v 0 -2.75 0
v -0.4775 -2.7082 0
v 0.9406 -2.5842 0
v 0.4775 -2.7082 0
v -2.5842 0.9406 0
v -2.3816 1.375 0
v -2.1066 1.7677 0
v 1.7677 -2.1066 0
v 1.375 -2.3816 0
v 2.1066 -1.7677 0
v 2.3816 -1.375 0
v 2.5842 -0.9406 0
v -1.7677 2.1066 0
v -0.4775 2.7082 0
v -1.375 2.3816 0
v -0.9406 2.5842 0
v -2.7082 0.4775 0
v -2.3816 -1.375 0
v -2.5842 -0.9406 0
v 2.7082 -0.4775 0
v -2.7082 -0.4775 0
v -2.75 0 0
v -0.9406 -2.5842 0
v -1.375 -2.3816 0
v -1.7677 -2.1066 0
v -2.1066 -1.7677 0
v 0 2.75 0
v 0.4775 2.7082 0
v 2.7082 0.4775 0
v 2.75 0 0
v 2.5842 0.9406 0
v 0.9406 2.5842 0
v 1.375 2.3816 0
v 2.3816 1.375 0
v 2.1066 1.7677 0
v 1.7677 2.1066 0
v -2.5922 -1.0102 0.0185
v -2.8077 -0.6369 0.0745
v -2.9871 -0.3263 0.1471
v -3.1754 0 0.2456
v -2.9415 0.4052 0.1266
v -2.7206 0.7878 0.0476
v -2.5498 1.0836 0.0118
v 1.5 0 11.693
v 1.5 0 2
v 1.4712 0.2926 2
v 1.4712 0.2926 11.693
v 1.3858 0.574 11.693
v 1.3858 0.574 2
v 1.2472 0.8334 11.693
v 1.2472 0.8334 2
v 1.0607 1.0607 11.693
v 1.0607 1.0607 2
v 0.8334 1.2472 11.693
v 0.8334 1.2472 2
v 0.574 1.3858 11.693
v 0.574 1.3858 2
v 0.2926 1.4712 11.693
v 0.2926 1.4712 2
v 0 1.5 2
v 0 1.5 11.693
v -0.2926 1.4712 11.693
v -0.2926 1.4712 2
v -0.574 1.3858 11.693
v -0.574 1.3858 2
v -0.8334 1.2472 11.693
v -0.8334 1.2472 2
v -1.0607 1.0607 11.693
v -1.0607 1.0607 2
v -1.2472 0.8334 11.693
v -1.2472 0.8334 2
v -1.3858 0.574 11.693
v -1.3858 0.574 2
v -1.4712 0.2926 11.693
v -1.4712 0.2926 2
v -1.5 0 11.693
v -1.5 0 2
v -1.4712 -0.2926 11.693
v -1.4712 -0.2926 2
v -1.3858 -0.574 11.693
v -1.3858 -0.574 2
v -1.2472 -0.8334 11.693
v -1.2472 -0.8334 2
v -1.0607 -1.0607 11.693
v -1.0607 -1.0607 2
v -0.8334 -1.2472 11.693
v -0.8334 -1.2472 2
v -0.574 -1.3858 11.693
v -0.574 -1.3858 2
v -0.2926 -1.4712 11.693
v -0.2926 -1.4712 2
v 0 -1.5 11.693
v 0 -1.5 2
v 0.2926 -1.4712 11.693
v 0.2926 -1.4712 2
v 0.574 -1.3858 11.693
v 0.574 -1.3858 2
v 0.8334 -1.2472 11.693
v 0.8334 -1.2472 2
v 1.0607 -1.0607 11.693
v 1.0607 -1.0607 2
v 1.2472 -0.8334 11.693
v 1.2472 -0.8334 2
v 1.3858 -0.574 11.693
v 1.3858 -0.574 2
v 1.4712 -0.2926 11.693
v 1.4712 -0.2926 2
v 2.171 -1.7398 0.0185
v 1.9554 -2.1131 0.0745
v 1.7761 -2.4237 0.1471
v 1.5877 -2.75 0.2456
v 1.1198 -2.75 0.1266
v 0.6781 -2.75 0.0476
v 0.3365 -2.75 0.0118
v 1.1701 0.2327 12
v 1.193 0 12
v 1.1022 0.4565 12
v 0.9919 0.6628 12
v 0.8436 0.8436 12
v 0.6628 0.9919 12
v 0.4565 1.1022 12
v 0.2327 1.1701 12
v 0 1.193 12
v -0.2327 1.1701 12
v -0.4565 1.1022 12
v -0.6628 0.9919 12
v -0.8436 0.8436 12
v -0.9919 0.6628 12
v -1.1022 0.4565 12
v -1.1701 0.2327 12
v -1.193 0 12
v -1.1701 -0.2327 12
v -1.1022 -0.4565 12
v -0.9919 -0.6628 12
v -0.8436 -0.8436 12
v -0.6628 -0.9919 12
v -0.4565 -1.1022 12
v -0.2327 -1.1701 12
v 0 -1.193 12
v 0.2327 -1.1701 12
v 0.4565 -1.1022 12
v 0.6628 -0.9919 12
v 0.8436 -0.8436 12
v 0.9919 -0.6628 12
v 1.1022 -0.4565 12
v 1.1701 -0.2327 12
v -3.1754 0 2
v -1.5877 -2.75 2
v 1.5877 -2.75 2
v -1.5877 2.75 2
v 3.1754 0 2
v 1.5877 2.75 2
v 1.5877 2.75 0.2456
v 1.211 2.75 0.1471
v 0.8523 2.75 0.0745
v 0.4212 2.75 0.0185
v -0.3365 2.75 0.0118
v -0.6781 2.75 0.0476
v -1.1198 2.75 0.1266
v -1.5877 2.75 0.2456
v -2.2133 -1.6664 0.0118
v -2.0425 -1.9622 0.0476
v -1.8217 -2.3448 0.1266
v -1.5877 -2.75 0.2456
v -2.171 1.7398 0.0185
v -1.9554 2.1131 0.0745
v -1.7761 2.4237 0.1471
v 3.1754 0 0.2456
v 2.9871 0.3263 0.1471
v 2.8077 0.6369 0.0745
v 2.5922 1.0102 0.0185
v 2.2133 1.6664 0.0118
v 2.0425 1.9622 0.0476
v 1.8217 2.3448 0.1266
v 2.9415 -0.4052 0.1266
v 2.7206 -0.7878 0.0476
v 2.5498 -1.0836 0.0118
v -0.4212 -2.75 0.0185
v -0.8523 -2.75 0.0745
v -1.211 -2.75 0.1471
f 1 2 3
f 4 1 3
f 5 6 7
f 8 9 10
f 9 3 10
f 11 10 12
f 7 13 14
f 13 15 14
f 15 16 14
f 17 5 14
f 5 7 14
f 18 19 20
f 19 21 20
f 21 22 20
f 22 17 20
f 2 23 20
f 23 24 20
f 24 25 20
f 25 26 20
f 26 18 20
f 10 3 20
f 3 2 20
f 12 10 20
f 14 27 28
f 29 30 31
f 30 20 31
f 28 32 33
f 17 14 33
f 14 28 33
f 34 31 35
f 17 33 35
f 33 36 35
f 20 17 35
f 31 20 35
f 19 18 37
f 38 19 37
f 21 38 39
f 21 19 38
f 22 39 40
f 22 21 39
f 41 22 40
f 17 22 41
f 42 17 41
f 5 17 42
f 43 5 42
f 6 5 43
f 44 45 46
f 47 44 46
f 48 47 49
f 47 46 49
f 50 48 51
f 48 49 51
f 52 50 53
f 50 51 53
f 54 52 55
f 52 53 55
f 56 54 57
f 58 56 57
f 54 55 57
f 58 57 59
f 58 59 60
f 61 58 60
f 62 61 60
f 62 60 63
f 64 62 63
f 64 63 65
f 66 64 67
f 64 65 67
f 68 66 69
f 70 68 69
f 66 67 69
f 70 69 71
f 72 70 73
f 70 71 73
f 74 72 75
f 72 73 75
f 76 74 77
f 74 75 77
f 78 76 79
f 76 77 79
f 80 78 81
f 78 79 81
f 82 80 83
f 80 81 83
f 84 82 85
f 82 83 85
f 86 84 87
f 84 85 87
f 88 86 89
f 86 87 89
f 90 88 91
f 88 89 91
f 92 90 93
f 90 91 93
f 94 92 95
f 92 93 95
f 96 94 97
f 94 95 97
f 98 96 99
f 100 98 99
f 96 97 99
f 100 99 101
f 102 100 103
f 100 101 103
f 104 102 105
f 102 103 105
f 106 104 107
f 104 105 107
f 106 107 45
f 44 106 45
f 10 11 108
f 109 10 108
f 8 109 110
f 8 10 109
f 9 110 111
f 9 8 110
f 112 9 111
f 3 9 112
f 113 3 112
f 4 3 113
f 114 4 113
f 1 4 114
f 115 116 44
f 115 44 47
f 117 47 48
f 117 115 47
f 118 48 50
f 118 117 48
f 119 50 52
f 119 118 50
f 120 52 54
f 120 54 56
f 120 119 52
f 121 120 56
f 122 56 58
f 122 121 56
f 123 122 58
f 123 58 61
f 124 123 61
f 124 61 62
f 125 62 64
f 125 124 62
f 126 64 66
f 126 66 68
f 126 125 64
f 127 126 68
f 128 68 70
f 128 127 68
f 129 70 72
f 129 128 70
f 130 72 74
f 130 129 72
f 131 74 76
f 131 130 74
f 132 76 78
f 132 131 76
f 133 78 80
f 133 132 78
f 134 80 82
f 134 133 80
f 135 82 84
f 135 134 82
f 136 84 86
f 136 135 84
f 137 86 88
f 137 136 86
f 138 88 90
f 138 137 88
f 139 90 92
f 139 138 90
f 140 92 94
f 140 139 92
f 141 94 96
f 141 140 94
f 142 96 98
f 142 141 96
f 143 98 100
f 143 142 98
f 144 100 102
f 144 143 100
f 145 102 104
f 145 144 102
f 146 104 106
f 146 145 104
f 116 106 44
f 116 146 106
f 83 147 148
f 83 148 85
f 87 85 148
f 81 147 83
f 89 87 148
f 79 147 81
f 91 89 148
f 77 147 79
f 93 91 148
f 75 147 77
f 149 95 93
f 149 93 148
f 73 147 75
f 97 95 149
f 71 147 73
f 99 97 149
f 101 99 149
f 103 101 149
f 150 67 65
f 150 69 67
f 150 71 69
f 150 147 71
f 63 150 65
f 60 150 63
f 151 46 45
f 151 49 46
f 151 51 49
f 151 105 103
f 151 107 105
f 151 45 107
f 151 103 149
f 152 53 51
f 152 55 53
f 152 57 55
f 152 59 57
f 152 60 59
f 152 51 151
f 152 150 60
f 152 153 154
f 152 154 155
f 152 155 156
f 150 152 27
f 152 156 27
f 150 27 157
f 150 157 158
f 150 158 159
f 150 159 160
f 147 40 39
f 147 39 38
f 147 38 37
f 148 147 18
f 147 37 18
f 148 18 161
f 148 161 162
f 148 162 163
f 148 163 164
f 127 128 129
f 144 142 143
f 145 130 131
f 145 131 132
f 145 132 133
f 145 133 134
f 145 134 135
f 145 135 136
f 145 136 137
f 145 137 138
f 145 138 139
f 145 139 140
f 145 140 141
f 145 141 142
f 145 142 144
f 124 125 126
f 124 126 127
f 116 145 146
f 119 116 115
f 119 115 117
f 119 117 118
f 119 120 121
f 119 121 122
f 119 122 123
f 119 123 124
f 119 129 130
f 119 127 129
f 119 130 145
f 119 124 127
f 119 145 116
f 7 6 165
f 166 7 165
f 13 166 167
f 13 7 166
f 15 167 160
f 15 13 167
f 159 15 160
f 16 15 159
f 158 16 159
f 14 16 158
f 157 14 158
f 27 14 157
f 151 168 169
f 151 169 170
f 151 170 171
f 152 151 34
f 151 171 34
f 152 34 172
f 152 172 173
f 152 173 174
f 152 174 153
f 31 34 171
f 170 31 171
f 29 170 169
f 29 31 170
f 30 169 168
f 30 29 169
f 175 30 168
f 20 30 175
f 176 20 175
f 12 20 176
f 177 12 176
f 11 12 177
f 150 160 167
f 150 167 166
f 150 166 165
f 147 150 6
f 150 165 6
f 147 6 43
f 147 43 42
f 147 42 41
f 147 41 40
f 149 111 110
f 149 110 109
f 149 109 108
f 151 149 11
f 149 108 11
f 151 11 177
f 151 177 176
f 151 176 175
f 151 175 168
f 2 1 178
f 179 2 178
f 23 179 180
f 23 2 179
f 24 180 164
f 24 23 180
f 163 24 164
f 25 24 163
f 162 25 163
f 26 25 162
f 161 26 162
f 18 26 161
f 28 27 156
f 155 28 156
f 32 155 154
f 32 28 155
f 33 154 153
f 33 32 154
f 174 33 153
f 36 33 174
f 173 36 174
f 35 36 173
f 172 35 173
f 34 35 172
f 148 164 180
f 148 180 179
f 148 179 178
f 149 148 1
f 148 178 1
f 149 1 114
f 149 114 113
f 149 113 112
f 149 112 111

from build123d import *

# Parameters (mm, degrees)
EXTRUDE1_DEPTH = 2
SKETCH2_R      = 1.5
EXTRUDE2_DEPTH = 10
CHAMFER1_SIZE  = 0.307


with BuildPart() as part:
    # Sketch1 → Extrude1 (new body)
    with BuildSketch(Plane.XY):
        Polygon((3.175426481, 0), (1.58771324, 2.75), (-1.58771324, 2.75), (-3.175426481, 0), (-1.58771324, -2.75), (1.58771324, -2.75), align=None)
    extrude(amount=EXTRUDE1_DEPTH)

    # Sketch2 → Extrude2 (add)
    with BuildSketch(Plane.XY.offset(2)):
        Circle(SKETCH2_R)
    extrude(amount=EXTRUDE2_DEPTH)

    # Sketch3 → Cut-Revolve1 (revolve, cut)
    with BuildSketch(Plane(origin=(0, 0, 0), x_dir=(0, 0, -1), z_dir=(1, 0, 0))):
        Polygon((0, 2.75), (0, 102.75), (-57.735026919, 102.75), align=None)
    revolve(axis=Axis((0, 0, 0), (0, 0, -1)), mode=Mode.SUBTRACT)

    # Chamfer1
    chamfer1_edges = [part.edges().sort_by_distance(p)[0] for p in [
        (-1.5, 0, 12),
    ]]
    chamfer(chamfer1_edges, length=CHAMFER1_SIZE)


solid = part.part
